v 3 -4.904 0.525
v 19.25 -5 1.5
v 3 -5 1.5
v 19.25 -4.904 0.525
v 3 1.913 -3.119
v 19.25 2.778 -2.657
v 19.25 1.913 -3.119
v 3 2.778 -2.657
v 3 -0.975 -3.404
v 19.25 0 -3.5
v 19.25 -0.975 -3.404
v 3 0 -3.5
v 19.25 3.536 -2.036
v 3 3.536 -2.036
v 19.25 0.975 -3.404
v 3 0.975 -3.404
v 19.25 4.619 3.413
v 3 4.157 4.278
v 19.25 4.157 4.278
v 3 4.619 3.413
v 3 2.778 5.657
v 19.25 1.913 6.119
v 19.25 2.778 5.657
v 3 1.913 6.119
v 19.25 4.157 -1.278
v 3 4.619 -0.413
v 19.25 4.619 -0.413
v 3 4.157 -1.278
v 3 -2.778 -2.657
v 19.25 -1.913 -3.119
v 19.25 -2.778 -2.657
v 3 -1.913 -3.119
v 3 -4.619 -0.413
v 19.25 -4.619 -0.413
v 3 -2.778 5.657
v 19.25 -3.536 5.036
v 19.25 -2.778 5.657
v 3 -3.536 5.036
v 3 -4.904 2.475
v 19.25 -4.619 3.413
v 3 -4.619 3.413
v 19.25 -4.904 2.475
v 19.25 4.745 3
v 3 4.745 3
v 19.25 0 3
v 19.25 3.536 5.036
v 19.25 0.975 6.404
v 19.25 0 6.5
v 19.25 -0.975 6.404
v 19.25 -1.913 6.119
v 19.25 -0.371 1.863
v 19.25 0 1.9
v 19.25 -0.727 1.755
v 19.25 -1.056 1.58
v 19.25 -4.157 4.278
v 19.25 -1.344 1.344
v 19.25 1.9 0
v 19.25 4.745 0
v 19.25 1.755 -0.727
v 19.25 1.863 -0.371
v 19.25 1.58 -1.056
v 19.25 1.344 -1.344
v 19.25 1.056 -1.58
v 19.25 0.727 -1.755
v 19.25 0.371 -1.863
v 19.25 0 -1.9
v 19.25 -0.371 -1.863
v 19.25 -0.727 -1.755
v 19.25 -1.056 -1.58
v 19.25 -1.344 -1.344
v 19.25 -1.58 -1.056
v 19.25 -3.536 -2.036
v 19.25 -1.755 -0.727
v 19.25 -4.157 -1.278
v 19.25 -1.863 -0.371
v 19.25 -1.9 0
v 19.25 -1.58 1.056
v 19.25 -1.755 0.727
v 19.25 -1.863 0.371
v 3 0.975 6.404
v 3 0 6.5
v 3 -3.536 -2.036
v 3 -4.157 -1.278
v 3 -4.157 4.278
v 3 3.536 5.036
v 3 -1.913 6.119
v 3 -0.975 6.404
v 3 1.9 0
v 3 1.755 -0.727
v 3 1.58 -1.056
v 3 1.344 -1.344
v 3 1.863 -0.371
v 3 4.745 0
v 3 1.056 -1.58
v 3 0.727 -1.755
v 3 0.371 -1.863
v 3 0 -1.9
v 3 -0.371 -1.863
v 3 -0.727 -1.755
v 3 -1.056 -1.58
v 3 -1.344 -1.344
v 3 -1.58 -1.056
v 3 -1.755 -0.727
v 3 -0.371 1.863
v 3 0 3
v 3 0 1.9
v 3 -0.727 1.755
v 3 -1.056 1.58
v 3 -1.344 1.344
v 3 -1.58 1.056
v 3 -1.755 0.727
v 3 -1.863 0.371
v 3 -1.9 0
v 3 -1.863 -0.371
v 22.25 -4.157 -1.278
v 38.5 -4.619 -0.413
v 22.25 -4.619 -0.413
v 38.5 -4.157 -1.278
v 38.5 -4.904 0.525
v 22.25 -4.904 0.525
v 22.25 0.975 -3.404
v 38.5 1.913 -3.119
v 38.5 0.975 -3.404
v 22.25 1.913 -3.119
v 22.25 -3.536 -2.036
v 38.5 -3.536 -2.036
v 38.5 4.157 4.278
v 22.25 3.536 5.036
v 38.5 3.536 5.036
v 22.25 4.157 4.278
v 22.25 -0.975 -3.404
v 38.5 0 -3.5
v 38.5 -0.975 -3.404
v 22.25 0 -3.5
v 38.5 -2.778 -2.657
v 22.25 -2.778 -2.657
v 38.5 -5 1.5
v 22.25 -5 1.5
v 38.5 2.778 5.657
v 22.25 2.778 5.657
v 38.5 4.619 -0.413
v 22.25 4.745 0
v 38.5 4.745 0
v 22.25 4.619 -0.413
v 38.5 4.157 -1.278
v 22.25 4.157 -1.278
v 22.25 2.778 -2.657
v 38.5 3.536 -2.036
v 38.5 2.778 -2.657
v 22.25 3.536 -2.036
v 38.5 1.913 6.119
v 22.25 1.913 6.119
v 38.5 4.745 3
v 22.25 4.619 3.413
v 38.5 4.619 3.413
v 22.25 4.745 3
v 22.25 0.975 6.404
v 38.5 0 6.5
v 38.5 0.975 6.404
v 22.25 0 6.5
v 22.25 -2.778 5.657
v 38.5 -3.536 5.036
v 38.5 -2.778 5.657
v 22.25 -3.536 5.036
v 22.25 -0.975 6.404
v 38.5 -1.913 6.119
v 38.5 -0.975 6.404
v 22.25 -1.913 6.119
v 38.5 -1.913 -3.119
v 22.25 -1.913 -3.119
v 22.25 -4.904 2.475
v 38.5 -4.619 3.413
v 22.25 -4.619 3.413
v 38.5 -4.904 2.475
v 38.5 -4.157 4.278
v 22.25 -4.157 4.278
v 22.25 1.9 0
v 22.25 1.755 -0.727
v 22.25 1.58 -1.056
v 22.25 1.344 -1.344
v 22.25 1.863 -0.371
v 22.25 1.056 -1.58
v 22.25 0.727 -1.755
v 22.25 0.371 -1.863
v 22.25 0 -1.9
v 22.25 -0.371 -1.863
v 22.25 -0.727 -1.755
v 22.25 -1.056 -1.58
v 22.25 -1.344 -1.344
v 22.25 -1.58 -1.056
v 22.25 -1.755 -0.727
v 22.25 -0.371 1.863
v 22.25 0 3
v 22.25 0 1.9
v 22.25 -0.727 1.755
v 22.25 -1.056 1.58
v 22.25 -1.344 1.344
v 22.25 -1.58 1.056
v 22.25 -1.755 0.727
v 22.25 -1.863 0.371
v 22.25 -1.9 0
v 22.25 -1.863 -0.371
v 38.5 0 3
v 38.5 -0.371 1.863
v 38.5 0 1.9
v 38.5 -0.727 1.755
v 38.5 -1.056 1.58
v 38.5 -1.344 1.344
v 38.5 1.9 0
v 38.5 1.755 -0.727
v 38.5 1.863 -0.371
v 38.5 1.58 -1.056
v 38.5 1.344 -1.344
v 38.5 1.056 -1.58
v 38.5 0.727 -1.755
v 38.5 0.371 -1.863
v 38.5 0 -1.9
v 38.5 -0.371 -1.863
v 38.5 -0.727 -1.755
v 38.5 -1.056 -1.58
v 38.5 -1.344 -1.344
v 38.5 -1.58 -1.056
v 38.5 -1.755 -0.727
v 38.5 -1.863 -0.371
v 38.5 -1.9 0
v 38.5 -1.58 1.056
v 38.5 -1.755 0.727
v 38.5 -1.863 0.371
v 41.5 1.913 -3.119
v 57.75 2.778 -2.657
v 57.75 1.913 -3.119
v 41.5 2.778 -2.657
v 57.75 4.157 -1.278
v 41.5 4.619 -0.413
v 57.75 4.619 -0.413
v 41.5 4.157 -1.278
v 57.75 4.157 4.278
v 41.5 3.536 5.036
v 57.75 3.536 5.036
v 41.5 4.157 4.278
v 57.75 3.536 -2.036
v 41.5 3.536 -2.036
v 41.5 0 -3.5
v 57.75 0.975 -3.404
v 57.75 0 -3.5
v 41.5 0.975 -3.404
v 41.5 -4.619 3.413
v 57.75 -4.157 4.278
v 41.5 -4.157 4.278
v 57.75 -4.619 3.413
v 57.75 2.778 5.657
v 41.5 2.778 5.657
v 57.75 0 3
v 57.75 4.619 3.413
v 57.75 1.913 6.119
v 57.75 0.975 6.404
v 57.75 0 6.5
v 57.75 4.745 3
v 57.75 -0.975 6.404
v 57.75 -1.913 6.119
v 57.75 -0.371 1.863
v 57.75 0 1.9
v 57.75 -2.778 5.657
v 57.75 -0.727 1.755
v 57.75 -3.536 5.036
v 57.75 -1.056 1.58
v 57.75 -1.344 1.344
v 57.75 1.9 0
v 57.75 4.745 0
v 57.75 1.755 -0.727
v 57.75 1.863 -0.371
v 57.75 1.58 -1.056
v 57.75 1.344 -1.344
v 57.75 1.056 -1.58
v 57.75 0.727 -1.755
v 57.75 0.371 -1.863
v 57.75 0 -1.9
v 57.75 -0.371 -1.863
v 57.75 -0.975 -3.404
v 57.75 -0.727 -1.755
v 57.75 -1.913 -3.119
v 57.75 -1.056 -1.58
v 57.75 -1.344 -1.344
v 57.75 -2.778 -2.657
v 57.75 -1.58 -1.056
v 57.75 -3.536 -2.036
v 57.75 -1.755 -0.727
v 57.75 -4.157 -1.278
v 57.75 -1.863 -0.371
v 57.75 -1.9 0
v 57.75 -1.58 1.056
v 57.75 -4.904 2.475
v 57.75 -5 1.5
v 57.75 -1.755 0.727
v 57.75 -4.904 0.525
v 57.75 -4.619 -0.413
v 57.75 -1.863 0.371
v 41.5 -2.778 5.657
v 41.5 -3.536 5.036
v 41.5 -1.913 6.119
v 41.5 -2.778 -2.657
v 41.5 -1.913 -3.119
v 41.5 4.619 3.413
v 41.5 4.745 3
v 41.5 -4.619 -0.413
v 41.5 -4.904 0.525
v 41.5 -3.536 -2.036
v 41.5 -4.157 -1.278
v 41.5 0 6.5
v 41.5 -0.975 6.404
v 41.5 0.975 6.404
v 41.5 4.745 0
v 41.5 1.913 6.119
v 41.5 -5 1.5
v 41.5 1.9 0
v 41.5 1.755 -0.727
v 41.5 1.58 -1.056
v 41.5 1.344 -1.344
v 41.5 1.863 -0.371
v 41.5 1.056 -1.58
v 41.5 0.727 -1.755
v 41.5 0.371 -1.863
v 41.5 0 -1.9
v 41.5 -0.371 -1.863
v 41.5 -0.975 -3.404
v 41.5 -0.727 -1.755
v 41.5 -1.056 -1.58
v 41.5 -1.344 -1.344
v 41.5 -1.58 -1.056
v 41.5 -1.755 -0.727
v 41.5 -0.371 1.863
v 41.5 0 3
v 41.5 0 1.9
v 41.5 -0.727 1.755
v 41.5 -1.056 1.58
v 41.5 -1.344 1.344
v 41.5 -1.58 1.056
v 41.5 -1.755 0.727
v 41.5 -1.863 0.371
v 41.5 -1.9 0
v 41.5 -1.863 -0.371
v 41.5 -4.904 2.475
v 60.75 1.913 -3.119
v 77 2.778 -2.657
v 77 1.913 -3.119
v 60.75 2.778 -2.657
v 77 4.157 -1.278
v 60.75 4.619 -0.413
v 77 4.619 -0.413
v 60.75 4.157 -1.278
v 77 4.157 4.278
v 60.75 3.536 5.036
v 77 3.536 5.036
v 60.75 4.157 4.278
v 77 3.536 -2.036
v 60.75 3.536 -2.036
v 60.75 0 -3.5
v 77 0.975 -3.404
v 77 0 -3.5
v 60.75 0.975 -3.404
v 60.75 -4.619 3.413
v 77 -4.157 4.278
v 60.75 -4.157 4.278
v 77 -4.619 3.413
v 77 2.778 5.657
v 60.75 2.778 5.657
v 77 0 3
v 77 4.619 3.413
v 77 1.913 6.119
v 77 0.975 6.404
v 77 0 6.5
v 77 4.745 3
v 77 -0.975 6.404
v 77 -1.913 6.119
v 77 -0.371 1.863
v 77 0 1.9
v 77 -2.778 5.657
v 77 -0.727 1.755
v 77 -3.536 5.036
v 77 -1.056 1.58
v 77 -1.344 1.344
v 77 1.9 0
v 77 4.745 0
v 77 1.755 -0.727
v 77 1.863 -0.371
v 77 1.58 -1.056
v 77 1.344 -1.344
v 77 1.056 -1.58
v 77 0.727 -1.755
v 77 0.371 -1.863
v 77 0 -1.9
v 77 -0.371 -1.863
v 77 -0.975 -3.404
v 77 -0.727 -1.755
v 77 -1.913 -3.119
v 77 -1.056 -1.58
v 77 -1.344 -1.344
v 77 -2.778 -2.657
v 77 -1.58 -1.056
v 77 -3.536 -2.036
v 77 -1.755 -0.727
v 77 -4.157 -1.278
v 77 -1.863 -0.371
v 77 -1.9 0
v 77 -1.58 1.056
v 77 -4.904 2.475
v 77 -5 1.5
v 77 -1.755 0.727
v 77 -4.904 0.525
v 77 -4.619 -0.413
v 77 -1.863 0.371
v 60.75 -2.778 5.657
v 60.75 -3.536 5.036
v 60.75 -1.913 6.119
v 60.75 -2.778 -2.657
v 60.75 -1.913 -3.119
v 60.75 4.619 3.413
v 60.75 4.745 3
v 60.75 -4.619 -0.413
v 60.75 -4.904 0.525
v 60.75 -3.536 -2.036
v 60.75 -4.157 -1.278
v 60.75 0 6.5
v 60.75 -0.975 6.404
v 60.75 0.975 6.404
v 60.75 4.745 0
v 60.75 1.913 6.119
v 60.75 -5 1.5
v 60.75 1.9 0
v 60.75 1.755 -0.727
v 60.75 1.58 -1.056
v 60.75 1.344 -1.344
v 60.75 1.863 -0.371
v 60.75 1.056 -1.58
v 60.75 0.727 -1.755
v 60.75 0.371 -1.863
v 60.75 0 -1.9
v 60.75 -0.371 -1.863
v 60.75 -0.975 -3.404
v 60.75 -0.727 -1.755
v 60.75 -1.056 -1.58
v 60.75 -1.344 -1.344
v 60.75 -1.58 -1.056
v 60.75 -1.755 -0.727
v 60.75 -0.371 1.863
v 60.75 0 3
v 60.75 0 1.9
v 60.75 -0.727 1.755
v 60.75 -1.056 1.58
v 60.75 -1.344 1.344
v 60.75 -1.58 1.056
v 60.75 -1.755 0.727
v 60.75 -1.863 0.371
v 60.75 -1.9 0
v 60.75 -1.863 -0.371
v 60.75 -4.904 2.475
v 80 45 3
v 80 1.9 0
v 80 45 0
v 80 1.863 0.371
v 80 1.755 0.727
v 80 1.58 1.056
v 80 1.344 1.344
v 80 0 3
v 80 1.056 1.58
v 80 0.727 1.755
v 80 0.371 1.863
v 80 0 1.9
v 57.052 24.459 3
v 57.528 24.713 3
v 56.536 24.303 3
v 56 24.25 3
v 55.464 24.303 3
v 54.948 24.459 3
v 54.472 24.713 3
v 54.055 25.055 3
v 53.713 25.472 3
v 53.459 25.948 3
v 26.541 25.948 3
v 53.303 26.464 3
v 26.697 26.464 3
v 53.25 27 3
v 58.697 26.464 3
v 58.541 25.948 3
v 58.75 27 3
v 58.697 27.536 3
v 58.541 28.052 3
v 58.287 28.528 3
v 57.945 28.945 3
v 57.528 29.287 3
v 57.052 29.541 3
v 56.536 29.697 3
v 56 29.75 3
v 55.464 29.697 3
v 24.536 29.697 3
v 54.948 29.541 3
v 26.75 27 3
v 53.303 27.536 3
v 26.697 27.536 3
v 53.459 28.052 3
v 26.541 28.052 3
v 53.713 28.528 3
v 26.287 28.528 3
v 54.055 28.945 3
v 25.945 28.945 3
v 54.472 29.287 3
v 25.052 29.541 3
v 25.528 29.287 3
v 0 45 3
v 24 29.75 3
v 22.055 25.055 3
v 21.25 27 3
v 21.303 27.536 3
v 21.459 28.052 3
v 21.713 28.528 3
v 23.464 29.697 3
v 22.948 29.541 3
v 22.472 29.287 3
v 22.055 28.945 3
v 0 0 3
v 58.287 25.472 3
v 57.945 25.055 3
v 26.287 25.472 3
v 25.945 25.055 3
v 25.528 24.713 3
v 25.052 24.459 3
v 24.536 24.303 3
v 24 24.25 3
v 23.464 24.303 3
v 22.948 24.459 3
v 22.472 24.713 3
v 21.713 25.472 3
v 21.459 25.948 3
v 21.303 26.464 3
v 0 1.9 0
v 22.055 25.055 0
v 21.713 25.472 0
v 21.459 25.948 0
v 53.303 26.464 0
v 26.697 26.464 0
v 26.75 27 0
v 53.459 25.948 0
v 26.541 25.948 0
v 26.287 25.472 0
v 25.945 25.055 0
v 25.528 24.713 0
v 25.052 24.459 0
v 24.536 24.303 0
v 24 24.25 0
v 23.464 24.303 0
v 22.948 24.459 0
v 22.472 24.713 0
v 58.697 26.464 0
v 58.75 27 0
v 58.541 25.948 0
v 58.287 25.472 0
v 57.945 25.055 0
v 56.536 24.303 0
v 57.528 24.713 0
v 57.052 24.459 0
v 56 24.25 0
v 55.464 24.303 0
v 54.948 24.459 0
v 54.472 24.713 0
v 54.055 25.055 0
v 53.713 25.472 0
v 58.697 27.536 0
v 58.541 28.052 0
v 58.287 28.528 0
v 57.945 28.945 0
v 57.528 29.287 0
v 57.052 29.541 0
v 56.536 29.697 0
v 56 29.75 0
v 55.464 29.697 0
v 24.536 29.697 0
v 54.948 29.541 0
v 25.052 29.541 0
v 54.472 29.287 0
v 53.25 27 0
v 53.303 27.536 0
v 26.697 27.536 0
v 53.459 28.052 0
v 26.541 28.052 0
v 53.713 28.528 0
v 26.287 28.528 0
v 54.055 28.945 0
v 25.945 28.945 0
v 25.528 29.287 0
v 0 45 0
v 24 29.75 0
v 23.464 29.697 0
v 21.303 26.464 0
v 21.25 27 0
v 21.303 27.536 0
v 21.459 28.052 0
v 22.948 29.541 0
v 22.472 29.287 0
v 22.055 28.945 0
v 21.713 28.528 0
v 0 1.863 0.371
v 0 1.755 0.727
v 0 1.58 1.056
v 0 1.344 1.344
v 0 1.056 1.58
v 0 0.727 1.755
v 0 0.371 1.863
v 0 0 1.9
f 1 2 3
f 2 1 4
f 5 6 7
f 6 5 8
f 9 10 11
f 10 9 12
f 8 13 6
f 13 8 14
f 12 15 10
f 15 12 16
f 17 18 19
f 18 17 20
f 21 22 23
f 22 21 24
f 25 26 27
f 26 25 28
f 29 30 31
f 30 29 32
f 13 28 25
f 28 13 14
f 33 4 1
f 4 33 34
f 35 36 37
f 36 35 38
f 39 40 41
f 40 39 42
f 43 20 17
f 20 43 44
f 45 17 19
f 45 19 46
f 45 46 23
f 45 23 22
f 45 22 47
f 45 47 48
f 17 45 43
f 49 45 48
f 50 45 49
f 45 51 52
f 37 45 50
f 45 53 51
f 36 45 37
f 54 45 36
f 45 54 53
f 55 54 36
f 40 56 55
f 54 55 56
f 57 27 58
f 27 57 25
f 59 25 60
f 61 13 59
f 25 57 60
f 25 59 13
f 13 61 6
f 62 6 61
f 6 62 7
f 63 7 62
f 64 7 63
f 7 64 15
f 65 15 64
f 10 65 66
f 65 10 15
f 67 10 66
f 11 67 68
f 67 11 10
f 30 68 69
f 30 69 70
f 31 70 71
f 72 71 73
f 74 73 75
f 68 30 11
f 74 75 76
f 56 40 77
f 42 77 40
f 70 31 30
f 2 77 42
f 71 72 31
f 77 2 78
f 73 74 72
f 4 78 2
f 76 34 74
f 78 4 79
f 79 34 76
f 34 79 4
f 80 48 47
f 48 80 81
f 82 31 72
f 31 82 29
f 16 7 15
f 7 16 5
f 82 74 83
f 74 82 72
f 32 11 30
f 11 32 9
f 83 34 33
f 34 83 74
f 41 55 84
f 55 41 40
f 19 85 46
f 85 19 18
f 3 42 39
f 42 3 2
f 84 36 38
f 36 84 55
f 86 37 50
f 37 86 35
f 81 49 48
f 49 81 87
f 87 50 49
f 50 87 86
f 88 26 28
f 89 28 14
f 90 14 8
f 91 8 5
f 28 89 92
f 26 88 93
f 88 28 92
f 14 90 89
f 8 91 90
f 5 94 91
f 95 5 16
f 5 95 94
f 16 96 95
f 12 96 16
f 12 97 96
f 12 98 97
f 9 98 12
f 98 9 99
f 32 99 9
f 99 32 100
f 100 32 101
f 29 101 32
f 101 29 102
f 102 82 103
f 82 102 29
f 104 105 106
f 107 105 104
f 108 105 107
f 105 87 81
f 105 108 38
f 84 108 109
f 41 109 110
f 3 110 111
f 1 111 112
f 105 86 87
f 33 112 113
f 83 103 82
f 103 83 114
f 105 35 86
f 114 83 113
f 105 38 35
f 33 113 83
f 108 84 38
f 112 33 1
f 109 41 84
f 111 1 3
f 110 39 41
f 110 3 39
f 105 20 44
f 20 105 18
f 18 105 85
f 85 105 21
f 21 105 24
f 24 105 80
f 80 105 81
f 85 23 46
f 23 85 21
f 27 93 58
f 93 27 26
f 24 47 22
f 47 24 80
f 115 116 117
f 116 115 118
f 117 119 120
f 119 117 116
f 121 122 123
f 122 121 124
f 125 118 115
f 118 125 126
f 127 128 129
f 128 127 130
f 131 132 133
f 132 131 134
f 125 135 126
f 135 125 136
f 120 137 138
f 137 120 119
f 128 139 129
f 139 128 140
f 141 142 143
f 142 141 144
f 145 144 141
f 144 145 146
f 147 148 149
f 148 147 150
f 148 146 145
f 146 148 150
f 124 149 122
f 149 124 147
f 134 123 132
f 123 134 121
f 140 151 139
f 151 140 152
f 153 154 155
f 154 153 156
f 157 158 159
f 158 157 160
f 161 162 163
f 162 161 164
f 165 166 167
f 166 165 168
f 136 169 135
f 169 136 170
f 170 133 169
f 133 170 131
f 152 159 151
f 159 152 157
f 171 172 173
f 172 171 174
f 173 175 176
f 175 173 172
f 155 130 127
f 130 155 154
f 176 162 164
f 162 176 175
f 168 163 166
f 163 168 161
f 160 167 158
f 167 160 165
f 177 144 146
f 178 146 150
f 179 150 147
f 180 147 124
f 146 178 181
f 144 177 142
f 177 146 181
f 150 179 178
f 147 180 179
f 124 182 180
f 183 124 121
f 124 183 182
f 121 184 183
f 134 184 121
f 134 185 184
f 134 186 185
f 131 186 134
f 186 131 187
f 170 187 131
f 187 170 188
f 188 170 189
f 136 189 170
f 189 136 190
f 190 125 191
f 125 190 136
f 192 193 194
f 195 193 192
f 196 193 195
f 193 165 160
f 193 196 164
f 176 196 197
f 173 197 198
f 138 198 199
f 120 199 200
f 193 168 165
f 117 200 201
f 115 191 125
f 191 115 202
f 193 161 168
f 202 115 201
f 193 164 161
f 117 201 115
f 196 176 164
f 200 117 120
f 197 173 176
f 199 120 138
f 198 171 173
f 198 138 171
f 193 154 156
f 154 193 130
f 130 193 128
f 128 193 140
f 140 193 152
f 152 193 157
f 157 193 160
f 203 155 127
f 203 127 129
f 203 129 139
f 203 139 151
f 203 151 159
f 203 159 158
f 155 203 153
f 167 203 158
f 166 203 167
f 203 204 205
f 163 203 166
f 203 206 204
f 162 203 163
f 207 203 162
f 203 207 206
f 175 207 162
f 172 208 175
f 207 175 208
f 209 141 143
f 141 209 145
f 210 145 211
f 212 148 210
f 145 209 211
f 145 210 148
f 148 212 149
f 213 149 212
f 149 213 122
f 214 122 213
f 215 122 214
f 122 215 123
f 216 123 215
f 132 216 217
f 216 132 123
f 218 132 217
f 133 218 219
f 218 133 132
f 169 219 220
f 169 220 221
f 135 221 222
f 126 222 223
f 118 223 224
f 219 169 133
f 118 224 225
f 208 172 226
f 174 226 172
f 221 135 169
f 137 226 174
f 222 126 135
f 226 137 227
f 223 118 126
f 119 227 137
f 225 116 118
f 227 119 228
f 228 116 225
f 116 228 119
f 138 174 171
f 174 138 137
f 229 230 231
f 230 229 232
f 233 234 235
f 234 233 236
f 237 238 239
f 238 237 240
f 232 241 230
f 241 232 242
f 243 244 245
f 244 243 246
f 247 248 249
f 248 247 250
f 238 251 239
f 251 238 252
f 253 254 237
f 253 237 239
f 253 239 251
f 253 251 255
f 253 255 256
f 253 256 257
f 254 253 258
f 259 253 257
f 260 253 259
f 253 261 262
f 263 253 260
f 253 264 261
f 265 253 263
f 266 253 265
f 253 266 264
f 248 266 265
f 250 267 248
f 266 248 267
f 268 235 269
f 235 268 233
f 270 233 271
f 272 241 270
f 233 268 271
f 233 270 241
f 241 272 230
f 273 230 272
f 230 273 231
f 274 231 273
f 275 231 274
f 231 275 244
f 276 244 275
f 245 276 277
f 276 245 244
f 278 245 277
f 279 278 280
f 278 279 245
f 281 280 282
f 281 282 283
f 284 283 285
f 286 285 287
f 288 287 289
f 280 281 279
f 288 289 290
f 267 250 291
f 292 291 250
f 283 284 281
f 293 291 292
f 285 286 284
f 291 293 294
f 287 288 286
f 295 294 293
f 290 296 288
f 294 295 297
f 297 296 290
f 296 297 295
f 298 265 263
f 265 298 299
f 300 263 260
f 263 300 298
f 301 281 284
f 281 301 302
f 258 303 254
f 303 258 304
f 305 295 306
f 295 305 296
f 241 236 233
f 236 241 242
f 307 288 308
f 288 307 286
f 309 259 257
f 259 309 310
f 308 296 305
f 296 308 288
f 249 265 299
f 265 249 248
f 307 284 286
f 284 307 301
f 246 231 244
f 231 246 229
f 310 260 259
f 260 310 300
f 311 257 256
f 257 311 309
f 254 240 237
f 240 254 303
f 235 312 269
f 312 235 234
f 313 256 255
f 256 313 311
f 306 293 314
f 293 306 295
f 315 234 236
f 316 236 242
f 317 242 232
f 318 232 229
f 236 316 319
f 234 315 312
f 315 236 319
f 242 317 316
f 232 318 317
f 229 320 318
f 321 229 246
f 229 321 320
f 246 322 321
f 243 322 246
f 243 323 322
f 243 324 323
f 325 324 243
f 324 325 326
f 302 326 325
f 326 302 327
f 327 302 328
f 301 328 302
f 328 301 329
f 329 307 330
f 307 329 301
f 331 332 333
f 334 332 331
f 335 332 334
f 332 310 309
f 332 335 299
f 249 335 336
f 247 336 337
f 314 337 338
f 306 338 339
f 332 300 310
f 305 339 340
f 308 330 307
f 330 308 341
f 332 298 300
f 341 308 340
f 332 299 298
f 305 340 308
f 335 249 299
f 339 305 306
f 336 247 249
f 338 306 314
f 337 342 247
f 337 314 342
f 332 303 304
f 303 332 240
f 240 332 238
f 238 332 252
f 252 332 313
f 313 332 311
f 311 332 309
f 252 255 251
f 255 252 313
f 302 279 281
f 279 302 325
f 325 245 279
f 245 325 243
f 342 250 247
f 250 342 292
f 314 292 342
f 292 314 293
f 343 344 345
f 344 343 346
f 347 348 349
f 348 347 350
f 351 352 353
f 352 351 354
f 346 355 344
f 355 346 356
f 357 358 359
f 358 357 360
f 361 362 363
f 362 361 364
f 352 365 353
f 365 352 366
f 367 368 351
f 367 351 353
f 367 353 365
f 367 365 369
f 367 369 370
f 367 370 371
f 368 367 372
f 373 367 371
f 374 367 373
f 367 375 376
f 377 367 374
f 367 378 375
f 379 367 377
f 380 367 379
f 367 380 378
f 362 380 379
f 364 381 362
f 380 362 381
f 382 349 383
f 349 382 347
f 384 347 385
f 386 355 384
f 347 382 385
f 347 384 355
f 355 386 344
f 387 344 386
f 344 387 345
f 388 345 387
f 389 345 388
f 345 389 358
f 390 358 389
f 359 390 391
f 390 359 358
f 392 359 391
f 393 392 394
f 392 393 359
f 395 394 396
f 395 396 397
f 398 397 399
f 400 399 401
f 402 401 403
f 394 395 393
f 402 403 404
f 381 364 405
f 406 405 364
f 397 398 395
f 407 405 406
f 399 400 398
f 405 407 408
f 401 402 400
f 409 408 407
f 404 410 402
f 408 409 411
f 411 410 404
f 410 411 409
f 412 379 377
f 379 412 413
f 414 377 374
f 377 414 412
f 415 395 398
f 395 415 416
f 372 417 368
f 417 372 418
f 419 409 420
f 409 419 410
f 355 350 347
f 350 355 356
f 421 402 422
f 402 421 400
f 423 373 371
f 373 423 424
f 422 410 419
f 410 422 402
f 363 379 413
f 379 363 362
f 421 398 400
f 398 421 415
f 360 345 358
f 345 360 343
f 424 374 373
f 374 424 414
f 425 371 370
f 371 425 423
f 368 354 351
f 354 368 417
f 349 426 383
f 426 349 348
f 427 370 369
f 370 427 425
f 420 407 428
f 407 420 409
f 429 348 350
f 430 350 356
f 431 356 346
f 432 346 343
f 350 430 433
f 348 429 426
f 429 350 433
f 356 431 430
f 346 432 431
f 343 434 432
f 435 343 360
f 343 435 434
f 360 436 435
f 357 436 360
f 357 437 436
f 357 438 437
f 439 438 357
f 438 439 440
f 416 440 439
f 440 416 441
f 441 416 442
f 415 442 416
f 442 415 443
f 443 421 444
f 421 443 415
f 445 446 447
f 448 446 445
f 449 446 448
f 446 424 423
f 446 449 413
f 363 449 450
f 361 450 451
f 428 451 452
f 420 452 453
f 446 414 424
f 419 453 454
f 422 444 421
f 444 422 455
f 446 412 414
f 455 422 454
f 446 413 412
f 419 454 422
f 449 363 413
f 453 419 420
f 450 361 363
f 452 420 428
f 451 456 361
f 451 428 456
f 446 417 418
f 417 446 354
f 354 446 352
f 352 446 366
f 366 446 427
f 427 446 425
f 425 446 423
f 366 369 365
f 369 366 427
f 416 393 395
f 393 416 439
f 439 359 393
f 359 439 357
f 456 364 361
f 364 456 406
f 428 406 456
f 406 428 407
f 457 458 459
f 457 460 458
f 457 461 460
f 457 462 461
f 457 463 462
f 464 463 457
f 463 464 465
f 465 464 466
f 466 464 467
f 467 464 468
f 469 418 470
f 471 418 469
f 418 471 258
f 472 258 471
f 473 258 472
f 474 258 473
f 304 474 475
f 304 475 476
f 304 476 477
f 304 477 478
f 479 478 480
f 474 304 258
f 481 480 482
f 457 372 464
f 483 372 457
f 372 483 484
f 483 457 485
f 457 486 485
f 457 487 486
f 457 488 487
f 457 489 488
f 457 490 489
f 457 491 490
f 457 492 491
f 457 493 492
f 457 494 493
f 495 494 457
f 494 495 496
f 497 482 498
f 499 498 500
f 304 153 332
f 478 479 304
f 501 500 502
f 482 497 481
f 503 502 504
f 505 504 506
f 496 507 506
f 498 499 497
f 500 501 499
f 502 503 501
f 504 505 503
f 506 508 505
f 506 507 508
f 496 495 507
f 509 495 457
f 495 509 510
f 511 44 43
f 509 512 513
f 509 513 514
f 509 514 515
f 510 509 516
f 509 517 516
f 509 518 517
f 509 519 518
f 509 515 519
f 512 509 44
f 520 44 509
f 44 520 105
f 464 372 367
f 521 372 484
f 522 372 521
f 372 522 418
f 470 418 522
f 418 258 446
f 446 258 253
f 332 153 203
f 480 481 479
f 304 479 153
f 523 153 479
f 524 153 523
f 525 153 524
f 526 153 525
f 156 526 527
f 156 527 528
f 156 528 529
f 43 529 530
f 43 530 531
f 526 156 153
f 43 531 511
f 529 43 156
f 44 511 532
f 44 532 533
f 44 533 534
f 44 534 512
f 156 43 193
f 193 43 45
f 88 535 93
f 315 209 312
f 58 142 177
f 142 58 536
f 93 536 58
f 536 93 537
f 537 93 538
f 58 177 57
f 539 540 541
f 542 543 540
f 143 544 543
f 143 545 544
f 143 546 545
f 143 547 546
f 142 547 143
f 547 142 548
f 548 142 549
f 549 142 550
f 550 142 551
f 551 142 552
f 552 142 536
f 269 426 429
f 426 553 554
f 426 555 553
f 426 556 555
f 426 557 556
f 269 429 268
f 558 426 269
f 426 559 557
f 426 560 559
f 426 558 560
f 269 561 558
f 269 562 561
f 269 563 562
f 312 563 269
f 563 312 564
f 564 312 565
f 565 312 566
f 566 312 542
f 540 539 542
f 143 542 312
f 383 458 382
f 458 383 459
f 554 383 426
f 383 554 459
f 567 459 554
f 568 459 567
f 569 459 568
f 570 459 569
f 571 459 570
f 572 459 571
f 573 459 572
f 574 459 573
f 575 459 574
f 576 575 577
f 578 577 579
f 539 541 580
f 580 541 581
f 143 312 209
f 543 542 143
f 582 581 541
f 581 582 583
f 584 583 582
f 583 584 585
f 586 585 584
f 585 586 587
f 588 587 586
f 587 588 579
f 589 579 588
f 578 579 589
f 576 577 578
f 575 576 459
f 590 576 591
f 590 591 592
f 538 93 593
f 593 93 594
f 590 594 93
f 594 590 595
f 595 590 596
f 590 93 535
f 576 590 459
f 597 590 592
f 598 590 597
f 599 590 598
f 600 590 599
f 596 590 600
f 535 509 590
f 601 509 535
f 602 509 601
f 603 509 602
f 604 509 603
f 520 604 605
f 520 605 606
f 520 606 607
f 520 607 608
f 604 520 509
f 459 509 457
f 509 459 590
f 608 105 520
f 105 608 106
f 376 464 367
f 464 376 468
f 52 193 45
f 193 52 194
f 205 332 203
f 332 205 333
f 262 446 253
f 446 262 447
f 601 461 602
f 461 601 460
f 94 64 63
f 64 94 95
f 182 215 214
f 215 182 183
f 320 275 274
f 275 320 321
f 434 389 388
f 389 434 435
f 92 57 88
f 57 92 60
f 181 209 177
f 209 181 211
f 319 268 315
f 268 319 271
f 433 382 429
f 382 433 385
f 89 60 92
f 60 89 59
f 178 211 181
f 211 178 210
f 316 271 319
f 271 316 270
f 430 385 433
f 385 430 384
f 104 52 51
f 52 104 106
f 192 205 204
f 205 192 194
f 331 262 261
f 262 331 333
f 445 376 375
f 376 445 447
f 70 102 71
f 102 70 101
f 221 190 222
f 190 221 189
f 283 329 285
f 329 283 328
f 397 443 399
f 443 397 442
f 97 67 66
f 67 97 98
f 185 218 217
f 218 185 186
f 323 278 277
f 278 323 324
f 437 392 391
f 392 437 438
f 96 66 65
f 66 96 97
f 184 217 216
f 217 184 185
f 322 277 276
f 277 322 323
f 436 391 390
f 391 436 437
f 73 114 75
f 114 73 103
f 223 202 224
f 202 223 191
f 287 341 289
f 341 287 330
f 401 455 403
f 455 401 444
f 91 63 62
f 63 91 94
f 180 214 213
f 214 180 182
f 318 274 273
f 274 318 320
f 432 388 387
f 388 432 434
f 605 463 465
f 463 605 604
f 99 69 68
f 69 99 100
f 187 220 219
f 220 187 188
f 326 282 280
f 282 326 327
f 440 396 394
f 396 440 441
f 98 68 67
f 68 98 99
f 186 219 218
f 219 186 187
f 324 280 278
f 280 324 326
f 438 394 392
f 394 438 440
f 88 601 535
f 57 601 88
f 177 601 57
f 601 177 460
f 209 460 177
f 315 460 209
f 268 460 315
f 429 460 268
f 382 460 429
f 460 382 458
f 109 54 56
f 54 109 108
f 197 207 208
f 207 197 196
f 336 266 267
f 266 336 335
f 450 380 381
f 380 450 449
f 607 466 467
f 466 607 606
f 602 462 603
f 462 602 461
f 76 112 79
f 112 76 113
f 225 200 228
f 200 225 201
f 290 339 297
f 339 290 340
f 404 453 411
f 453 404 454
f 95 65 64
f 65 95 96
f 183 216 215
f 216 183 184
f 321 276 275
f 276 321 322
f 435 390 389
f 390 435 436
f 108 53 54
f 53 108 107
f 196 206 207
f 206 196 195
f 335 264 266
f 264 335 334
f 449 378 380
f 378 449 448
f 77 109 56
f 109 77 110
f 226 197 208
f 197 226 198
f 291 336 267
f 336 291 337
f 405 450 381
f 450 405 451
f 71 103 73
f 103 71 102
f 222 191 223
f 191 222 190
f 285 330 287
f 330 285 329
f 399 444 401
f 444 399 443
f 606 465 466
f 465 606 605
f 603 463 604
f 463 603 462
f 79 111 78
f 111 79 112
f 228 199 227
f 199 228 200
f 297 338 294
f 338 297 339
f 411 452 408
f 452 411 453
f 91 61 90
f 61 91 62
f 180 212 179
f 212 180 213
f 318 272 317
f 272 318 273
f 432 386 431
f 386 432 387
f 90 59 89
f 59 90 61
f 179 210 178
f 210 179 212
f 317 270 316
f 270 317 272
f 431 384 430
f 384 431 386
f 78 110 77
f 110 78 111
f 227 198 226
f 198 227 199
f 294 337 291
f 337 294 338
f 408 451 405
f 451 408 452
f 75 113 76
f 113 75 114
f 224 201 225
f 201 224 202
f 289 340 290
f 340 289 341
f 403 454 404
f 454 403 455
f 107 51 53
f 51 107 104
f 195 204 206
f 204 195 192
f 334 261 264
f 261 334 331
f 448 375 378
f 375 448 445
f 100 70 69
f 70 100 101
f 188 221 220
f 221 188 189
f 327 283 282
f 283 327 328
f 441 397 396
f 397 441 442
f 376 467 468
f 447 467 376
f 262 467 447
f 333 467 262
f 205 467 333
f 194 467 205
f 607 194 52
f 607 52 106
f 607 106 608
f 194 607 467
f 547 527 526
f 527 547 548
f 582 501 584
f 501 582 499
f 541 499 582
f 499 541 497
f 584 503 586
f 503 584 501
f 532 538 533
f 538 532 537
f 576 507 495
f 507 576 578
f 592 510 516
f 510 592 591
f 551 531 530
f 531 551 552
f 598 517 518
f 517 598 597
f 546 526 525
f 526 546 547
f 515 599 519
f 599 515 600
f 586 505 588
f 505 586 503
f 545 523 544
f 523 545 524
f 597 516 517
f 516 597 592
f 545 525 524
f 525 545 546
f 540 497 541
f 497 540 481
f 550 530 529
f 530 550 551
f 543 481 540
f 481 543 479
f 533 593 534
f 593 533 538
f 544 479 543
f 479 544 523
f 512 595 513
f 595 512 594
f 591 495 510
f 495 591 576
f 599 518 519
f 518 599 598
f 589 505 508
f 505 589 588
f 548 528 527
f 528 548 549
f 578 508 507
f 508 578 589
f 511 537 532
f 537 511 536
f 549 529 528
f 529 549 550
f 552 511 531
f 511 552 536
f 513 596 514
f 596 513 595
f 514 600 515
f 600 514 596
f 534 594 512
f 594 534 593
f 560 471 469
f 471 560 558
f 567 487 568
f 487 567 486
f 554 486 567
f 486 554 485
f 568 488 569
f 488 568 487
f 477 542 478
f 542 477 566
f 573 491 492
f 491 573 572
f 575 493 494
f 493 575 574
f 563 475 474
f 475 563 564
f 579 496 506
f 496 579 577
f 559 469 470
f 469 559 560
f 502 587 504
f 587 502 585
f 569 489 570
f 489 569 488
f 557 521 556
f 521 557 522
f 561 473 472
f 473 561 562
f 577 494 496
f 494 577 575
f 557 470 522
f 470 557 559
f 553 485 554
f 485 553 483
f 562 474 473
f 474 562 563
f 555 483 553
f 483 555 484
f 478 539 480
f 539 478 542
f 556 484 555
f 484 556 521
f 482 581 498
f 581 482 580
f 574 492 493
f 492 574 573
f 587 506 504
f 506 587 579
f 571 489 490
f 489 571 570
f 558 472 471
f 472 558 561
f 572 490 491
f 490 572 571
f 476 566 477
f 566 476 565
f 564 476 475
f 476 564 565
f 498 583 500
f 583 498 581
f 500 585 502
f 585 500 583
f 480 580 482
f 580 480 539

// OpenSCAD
$fn = 32;

// ----------------------------------------------------------------------
// Hinge leaf: 80 x 50 x 10 mm
// ----------------------------------------------------------------------

// --- parameters (mm) ---
tab_len = 80;             // leaf length, X
tab_w = 45;               // leaf width, Y
tab_t = 3;                // leaf thickness
ring_d = 10;              // knuckle diameter
ring_w = 16.25;           // knuckle width
knuckle_n = 4;            // number of knuckles
pin_d = 3.8;              // pin bore
gap = 3;                  // gap between the knuckles
screw_d = 5.5;            // screw clearance

module leaf() {
  cube([tab_len, tab_w, tab_t]);
}

module knuckles() {
  /* barrels sit on the leaf edge, the pin axis at half the leaf thickness */
  for (i = [0 : knuckle_n - 1])
    translate([gap + i * (ring_w + gap), 0, tab_t * 0.5])
      rotate([0, 90, 0]) cylinder(h = ring_w, d = ring_d);
}

difference() {
  union() {
    leaf();
    knuckles();
  }
  rotate([0, 90, 0]) translate([0, 0, -1])
    cylinder(h = tab_len + 2, d = pin_d);
  translate([24, tab_w * 0.6, -1]) cylinder(h = tab_t + 2, d = screw_d);
  translate([56, tab_w * 0.6, -1]) cylinder(h = tab_t + 2, d = screw_d);
}
